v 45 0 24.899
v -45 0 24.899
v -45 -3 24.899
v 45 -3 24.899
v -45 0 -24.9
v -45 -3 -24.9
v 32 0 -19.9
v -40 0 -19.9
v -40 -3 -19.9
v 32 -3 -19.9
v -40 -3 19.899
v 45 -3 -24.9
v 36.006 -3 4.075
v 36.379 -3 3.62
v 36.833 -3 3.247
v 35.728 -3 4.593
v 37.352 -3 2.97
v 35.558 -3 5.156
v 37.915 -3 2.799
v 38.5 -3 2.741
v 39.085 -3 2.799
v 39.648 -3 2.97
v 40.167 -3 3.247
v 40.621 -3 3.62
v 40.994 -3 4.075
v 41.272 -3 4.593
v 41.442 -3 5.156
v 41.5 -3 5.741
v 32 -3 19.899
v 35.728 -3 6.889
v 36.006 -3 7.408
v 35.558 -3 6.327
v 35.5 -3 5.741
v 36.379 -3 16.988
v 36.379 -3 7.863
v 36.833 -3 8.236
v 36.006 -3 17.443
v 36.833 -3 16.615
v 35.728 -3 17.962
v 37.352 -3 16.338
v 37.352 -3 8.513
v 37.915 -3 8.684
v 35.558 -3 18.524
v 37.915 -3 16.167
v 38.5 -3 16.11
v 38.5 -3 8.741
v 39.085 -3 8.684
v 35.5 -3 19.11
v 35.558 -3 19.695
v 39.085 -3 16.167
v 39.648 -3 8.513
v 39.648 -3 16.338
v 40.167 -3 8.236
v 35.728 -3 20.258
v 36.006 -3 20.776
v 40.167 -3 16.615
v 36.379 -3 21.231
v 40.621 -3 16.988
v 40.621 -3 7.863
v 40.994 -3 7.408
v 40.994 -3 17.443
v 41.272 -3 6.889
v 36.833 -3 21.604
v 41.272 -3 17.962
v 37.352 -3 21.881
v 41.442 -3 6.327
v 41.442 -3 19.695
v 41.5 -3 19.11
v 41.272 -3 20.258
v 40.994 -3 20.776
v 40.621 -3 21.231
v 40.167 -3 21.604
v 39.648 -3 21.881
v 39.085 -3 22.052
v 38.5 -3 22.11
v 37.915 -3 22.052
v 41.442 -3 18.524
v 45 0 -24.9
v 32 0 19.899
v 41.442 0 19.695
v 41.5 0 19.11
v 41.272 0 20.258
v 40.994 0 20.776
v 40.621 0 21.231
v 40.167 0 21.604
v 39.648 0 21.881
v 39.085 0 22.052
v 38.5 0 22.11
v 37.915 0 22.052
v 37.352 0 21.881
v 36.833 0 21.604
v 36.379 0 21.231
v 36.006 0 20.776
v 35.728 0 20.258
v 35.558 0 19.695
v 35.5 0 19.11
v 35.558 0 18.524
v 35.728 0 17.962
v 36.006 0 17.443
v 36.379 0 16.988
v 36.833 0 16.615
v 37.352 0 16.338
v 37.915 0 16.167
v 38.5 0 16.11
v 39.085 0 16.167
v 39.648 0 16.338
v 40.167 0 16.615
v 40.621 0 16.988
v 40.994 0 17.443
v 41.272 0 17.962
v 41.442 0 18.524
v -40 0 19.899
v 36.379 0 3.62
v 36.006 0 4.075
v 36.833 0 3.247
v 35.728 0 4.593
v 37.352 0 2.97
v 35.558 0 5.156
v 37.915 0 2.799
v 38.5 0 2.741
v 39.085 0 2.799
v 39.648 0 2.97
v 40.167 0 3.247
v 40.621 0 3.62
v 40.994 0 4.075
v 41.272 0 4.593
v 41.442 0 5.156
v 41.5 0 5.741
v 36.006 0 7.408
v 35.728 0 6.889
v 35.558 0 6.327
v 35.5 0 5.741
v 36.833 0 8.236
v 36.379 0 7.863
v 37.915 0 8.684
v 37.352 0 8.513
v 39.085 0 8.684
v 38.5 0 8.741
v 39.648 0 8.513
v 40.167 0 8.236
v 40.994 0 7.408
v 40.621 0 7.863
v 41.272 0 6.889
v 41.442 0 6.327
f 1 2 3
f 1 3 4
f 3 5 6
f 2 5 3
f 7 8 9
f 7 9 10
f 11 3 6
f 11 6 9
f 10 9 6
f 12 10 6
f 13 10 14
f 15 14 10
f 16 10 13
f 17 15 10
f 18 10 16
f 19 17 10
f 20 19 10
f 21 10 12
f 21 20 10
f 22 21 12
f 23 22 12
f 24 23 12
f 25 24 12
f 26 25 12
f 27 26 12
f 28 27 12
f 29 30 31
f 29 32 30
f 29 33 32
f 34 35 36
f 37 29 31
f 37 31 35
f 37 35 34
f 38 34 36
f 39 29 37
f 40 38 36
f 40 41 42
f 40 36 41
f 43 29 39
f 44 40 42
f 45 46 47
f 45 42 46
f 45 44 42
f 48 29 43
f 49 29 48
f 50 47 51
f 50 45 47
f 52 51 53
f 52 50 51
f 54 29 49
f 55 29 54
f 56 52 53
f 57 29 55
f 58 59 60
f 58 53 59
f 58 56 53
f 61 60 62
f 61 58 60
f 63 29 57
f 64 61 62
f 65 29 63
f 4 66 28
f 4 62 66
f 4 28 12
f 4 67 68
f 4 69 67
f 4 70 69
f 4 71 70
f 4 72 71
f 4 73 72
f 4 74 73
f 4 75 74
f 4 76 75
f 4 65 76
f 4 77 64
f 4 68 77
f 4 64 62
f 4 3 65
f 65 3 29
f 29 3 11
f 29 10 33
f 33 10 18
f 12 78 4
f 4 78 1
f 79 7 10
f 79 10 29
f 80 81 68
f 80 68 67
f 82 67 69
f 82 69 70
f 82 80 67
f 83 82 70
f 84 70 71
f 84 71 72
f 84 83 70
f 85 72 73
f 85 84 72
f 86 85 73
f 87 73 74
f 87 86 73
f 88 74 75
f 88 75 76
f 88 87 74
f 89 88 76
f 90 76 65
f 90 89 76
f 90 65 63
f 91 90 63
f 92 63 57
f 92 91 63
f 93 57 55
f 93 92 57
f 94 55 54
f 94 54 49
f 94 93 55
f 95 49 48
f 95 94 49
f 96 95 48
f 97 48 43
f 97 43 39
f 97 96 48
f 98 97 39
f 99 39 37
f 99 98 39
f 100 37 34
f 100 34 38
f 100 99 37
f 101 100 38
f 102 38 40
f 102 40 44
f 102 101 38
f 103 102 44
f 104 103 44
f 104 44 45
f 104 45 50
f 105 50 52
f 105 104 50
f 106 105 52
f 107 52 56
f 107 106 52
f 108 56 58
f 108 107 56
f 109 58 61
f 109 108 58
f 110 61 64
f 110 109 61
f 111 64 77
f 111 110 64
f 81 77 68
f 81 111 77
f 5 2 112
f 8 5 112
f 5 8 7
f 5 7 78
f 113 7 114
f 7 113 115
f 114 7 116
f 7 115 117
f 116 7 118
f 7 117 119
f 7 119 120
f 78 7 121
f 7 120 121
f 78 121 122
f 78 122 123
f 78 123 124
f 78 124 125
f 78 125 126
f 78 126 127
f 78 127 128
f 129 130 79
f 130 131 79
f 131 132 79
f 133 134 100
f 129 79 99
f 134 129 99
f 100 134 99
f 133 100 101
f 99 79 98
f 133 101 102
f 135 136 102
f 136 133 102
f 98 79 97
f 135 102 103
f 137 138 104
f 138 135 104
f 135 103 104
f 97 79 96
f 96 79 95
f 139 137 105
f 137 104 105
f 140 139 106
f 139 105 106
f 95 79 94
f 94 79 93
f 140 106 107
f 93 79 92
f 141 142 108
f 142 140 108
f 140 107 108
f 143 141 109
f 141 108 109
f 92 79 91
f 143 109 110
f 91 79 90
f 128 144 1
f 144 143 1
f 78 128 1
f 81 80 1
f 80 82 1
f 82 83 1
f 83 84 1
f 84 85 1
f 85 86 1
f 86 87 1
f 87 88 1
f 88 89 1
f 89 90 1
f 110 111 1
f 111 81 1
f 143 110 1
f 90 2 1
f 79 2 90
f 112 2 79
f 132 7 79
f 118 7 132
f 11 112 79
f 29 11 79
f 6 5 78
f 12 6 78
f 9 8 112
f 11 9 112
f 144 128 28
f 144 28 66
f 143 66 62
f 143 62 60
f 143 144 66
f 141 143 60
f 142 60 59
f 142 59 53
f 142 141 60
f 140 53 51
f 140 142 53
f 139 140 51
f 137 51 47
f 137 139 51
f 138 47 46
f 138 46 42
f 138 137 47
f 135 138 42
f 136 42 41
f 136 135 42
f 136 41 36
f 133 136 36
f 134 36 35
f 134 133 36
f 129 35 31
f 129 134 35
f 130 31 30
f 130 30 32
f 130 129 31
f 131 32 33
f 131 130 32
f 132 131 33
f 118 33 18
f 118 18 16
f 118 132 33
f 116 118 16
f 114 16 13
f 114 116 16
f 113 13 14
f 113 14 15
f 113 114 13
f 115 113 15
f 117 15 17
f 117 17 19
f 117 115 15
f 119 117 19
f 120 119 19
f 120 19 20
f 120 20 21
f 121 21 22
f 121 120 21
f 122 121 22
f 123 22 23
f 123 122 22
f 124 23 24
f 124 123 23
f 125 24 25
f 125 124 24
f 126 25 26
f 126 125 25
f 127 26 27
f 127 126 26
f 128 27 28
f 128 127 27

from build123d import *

# Parameters (mm, degrees)
F0_W     = 90
F0_H     = 49.79875
F0_W_2   = 72
F0_H_2   = 39.79875
F0_R     = 3
F1_DEPTH = 3


with BuildPart() as f1:
    # F0 (on Front) → F1 (new body)
    with BuildSketch(Plane.XZ):
        with Locations((0, -0.000125)):
            Rectangle(F0_W, F0_H)
        with Locations((-4, -0.000125)):
            Rectangle(F0_W_2, F0_H_2, mode=Mode.SUBTRACT)
        with Locations((38.5, 5.741427)):
            Circle(F0_R, mode=Mode.SUBTRACT)
        with Locations((38.5, 19.10959)):
            Circle(F0_R, mode=Mode.SUBTRACT)
    extrude(amount=F1_DEPTH)


solid = f1.part
